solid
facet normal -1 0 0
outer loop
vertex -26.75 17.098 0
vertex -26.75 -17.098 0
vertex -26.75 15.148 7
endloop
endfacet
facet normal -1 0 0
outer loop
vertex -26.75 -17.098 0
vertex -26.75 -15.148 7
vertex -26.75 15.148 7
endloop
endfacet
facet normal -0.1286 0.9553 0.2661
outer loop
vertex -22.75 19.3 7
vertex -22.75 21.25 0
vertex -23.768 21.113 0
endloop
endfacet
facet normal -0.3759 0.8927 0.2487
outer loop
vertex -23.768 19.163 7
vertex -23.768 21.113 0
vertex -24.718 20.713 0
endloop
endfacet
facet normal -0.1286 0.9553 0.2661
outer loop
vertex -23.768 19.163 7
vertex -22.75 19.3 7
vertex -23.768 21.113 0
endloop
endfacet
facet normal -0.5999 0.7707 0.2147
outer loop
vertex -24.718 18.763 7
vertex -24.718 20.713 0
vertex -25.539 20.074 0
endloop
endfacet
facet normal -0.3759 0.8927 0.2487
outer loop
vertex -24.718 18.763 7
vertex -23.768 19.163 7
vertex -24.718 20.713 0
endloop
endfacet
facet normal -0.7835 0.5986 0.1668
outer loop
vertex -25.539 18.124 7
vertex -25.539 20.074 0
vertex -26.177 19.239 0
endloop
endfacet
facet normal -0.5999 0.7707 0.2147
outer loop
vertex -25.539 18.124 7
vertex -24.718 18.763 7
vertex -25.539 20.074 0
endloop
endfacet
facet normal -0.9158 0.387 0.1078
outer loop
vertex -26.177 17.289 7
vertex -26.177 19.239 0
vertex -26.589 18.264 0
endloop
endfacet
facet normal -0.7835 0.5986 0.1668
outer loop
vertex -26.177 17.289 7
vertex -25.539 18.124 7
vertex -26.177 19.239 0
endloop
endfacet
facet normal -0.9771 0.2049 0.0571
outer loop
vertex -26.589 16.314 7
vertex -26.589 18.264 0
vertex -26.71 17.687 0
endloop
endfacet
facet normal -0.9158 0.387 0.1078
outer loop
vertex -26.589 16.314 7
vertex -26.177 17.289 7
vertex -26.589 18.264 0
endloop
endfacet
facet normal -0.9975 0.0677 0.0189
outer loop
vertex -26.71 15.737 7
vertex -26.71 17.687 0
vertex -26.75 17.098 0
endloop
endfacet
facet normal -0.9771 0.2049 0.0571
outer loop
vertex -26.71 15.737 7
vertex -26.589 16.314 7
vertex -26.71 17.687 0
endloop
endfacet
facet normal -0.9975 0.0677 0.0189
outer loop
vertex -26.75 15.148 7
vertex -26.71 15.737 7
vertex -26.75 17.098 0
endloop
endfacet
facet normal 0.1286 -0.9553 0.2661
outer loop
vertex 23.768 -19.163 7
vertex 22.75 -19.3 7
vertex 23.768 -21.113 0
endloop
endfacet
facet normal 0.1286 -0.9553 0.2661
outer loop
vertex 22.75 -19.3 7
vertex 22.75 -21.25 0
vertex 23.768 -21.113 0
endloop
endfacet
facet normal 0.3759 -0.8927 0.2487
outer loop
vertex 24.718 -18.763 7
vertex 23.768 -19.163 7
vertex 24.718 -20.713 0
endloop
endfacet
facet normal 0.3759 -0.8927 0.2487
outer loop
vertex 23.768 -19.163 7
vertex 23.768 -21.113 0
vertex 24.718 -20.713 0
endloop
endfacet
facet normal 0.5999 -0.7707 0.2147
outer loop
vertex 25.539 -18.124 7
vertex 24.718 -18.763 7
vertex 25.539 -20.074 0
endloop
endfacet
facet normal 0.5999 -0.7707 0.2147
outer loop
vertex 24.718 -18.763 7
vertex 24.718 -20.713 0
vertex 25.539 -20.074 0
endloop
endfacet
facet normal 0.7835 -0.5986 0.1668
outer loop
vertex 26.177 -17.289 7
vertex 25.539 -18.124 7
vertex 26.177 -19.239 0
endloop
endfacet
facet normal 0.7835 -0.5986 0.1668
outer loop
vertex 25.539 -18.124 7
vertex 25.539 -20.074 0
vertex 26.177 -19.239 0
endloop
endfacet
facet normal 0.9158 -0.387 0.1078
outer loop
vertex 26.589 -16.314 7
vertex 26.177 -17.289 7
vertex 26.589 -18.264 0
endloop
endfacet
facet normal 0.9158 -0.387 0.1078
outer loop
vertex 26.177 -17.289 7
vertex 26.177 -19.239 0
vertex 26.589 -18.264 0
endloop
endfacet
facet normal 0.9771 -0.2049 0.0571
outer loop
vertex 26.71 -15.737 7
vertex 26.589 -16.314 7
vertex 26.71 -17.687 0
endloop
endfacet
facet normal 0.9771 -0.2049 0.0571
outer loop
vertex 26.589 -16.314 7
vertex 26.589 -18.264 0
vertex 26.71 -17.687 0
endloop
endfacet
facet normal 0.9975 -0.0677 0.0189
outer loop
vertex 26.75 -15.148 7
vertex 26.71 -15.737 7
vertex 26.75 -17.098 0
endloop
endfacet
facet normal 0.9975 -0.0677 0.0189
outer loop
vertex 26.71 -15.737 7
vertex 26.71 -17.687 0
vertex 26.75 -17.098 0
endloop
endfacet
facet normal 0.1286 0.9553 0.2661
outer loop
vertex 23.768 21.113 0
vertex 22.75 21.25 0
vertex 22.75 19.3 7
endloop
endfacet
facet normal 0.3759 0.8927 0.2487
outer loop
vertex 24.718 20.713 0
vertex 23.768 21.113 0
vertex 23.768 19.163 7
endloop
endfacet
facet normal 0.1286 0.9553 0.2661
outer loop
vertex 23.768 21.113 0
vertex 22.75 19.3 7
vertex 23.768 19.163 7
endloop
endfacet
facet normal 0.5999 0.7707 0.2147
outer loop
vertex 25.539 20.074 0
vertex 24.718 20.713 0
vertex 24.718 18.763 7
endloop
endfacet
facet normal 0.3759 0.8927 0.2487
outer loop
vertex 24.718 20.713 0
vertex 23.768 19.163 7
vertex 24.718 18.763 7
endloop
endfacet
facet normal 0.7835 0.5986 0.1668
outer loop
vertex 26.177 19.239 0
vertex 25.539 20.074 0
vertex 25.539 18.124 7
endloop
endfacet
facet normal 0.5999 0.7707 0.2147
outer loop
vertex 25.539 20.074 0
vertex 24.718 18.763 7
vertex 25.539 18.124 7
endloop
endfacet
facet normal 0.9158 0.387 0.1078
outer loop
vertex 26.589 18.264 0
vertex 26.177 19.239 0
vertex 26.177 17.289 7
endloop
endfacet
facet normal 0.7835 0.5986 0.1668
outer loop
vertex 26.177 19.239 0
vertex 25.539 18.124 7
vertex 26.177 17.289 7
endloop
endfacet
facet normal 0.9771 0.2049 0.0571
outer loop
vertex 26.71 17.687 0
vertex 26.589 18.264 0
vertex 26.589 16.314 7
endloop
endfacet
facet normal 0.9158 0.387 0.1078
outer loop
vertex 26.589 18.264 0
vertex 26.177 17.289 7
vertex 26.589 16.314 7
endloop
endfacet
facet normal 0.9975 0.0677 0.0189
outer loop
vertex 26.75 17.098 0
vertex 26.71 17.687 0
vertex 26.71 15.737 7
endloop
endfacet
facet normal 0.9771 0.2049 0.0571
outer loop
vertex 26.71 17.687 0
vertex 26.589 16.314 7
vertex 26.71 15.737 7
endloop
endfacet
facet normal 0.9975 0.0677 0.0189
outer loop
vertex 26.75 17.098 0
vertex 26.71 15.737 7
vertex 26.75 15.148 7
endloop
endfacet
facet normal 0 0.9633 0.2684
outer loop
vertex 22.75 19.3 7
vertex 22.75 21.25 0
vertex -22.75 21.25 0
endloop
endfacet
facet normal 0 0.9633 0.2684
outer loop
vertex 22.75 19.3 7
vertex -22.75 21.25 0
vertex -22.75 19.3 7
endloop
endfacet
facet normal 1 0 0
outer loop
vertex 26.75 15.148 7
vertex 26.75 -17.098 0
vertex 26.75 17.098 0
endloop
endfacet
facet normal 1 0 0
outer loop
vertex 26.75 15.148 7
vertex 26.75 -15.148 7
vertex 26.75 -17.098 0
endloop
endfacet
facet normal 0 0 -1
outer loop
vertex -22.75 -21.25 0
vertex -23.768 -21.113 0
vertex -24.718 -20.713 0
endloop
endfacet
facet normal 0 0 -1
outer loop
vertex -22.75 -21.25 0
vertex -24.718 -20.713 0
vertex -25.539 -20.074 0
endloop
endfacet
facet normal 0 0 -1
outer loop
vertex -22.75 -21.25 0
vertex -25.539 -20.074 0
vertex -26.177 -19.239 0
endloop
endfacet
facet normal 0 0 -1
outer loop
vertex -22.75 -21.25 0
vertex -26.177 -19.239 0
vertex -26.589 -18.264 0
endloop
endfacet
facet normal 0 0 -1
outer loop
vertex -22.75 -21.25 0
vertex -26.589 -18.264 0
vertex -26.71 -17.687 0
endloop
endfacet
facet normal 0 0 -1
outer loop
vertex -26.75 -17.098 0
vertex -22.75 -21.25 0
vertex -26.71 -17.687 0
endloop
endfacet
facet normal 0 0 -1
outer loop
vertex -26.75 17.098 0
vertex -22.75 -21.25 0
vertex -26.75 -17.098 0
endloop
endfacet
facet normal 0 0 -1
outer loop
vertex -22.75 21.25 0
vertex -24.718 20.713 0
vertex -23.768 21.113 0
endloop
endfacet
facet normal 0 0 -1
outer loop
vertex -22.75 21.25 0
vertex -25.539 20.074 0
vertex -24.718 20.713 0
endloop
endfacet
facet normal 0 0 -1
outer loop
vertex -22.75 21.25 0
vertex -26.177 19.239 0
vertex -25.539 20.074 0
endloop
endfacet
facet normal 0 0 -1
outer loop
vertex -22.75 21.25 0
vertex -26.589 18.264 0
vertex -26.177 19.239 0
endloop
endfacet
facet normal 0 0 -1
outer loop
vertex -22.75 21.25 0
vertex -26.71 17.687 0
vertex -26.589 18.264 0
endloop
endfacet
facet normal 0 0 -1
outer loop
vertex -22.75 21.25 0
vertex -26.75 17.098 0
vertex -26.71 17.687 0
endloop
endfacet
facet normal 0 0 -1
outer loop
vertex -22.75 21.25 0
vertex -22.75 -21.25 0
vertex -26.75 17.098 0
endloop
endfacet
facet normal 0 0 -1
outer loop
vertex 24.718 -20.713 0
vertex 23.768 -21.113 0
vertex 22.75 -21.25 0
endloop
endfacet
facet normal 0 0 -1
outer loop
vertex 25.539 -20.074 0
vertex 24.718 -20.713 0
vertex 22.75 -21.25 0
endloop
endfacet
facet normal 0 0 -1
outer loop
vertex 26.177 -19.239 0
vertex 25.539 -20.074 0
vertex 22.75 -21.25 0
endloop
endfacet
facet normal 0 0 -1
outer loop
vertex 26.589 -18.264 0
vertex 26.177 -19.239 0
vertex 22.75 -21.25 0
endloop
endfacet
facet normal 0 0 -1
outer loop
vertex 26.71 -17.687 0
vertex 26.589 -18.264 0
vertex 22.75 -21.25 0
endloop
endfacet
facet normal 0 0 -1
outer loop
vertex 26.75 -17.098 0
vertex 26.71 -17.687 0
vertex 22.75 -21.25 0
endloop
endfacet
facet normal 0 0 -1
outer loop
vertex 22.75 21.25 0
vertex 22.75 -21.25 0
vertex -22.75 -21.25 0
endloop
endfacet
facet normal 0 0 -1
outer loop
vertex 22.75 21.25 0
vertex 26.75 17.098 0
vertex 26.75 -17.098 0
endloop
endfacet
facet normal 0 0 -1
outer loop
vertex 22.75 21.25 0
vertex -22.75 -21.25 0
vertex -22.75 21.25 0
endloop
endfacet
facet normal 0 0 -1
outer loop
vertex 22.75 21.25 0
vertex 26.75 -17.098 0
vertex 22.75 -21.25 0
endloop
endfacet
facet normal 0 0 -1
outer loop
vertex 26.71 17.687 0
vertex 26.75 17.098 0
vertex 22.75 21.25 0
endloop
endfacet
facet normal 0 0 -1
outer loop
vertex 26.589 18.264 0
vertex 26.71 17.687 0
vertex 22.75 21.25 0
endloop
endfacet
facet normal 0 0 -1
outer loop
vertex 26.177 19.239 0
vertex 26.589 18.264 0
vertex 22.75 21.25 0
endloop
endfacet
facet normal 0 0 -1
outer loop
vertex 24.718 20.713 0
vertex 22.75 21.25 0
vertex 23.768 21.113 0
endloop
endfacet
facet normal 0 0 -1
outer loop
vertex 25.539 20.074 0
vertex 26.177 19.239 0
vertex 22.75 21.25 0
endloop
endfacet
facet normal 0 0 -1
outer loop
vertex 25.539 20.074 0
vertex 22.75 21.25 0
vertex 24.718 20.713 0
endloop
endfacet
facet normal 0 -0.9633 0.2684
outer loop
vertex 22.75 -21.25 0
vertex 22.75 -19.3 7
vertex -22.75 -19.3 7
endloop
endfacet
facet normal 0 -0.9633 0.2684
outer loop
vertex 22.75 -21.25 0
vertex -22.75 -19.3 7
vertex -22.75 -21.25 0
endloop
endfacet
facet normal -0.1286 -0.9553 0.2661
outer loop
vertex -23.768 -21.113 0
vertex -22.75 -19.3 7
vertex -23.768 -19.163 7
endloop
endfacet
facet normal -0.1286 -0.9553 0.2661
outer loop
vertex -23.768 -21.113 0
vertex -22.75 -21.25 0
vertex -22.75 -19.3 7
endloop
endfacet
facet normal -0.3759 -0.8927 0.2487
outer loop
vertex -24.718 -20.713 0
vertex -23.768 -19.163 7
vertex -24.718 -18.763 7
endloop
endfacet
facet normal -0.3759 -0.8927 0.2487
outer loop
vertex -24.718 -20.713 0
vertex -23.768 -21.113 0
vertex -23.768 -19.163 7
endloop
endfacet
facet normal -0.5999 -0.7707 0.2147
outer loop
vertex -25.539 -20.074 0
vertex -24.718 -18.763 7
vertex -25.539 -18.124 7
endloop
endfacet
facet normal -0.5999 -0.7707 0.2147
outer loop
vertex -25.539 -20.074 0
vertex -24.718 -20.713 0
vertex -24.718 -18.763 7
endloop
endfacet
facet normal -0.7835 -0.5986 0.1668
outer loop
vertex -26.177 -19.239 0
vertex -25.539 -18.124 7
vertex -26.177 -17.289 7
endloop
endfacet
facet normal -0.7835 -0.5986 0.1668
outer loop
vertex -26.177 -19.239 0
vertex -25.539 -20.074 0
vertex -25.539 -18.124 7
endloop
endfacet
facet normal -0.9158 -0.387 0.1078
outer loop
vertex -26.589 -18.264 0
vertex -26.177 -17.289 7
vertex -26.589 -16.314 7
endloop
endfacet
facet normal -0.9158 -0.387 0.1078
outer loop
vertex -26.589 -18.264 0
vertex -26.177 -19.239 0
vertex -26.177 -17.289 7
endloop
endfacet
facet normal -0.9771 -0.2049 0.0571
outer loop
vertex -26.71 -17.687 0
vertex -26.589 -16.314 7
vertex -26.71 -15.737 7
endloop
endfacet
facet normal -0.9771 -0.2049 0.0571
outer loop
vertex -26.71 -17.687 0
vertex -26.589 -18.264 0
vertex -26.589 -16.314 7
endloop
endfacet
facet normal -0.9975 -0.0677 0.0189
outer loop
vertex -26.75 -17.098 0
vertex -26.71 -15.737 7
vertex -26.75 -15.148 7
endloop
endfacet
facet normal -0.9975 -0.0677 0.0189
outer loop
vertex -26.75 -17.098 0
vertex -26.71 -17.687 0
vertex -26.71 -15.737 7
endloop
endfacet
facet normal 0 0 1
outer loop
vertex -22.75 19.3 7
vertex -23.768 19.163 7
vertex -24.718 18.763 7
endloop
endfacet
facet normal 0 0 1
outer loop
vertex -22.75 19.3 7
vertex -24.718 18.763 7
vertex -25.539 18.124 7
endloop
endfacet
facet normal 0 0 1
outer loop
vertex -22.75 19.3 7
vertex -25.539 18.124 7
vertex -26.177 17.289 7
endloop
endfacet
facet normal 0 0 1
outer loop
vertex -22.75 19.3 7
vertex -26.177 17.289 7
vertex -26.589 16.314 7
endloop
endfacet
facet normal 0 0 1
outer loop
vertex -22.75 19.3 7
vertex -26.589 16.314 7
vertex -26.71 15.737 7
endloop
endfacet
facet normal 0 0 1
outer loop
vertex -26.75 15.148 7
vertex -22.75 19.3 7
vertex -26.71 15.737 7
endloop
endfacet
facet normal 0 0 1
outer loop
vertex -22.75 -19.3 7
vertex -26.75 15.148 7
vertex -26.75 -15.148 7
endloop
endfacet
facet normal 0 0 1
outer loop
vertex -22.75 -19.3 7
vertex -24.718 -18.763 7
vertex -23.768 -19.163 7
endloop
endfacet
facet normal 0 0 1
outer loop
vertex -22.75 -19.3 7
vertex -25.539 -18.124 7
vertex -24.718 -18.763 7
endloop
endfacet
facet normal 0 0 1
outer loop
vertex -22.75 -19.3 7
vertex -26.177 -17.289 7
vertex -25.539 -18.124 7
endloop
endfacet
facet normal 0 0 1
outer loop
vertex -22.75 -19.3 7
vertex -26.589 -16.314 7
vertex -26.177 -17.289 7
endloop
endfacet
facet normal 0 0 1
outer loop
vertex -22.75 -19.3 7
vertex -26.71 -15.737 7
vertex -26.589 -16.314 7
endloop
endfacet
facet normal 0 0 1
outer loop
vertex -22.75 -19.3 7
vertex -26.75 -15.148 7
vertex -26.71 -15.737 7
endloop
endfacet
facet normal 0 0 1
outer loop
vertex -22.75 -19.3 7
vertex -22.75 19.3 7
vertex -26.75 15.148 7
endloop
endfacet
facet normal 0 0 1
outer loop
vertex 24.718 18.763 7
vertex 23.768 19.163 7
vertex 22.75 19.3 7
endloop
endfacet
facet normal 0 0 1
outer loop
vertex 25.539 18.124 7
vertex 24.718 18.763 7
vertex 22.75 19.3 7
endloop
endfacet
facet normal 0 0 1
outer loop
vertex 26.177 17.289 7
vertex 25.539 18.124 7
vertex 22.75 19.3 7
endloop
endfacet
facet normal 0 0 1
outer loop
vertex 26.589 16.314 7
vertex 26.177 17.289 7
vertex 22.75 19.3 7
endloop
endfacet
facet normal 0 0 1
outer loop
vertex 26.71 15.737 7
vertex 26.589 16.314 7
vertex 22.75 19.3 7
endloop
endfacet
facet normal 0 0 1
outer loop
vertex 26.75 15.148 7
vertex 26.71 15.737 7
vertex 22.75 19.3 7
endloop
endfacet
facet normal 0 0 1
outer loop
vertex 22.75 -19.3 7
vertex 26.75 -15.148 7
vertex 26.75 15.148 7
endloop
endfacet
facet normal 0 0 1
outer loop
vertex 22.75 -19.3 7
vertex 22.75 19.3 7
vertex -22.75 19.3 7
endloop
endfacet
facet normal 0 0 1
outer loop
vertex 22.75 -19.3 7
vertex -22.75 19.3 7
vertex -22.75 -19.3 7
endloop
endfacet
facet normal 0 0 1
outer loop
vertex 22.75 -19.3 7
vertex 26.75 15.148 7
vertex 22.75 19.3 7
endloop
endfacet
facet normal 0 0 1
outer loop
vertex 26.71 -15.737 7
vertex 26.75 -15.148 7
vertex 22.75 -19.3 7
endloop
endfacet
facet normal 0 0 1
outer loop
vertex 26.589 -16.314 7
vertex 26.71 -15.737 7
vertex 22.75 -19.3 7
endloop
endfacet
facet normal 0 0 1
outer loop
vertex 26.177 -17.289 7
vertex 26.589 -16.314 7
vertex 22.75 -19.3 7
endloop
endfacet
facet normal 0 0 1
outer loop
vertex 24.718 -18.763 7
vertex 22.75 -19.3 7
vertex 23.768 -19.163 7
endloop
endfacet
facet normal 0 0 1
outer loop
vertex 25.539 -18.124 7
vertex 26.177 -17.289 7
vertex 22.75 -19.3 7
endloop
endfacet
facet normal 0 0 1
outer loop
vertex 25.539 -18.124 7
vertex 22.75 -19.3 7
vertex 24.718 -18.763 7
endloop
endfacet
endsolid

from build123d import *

# Parameters (mm, degrees)
F2_DEPTH = 26.75
F3_R     = 4


with BuildPart() as f2:
    # F1 (on Right) → F2 (new body, symmetric)
    with BuildSketch(Plane.YZ):
        Polygon((-19.3, 7), (-21.25, 0), (21.25, 0), (19.3, 7), align=None)
    extrude(amount=F2_DEPTH, both=True)

    # F3
    f3_edges = [f2.edges().sort_by_distance(p)[0] for p in [
        (-26.75, -20.275, 3.5),
        (26.75, -20.275, 3.5),
        (26.75, 20.275, 3.5),
        (-26.75, 20.275, 3.5),
    ]]
    fillet(f3_edges, radius=F3_R)


solid = f2.part
